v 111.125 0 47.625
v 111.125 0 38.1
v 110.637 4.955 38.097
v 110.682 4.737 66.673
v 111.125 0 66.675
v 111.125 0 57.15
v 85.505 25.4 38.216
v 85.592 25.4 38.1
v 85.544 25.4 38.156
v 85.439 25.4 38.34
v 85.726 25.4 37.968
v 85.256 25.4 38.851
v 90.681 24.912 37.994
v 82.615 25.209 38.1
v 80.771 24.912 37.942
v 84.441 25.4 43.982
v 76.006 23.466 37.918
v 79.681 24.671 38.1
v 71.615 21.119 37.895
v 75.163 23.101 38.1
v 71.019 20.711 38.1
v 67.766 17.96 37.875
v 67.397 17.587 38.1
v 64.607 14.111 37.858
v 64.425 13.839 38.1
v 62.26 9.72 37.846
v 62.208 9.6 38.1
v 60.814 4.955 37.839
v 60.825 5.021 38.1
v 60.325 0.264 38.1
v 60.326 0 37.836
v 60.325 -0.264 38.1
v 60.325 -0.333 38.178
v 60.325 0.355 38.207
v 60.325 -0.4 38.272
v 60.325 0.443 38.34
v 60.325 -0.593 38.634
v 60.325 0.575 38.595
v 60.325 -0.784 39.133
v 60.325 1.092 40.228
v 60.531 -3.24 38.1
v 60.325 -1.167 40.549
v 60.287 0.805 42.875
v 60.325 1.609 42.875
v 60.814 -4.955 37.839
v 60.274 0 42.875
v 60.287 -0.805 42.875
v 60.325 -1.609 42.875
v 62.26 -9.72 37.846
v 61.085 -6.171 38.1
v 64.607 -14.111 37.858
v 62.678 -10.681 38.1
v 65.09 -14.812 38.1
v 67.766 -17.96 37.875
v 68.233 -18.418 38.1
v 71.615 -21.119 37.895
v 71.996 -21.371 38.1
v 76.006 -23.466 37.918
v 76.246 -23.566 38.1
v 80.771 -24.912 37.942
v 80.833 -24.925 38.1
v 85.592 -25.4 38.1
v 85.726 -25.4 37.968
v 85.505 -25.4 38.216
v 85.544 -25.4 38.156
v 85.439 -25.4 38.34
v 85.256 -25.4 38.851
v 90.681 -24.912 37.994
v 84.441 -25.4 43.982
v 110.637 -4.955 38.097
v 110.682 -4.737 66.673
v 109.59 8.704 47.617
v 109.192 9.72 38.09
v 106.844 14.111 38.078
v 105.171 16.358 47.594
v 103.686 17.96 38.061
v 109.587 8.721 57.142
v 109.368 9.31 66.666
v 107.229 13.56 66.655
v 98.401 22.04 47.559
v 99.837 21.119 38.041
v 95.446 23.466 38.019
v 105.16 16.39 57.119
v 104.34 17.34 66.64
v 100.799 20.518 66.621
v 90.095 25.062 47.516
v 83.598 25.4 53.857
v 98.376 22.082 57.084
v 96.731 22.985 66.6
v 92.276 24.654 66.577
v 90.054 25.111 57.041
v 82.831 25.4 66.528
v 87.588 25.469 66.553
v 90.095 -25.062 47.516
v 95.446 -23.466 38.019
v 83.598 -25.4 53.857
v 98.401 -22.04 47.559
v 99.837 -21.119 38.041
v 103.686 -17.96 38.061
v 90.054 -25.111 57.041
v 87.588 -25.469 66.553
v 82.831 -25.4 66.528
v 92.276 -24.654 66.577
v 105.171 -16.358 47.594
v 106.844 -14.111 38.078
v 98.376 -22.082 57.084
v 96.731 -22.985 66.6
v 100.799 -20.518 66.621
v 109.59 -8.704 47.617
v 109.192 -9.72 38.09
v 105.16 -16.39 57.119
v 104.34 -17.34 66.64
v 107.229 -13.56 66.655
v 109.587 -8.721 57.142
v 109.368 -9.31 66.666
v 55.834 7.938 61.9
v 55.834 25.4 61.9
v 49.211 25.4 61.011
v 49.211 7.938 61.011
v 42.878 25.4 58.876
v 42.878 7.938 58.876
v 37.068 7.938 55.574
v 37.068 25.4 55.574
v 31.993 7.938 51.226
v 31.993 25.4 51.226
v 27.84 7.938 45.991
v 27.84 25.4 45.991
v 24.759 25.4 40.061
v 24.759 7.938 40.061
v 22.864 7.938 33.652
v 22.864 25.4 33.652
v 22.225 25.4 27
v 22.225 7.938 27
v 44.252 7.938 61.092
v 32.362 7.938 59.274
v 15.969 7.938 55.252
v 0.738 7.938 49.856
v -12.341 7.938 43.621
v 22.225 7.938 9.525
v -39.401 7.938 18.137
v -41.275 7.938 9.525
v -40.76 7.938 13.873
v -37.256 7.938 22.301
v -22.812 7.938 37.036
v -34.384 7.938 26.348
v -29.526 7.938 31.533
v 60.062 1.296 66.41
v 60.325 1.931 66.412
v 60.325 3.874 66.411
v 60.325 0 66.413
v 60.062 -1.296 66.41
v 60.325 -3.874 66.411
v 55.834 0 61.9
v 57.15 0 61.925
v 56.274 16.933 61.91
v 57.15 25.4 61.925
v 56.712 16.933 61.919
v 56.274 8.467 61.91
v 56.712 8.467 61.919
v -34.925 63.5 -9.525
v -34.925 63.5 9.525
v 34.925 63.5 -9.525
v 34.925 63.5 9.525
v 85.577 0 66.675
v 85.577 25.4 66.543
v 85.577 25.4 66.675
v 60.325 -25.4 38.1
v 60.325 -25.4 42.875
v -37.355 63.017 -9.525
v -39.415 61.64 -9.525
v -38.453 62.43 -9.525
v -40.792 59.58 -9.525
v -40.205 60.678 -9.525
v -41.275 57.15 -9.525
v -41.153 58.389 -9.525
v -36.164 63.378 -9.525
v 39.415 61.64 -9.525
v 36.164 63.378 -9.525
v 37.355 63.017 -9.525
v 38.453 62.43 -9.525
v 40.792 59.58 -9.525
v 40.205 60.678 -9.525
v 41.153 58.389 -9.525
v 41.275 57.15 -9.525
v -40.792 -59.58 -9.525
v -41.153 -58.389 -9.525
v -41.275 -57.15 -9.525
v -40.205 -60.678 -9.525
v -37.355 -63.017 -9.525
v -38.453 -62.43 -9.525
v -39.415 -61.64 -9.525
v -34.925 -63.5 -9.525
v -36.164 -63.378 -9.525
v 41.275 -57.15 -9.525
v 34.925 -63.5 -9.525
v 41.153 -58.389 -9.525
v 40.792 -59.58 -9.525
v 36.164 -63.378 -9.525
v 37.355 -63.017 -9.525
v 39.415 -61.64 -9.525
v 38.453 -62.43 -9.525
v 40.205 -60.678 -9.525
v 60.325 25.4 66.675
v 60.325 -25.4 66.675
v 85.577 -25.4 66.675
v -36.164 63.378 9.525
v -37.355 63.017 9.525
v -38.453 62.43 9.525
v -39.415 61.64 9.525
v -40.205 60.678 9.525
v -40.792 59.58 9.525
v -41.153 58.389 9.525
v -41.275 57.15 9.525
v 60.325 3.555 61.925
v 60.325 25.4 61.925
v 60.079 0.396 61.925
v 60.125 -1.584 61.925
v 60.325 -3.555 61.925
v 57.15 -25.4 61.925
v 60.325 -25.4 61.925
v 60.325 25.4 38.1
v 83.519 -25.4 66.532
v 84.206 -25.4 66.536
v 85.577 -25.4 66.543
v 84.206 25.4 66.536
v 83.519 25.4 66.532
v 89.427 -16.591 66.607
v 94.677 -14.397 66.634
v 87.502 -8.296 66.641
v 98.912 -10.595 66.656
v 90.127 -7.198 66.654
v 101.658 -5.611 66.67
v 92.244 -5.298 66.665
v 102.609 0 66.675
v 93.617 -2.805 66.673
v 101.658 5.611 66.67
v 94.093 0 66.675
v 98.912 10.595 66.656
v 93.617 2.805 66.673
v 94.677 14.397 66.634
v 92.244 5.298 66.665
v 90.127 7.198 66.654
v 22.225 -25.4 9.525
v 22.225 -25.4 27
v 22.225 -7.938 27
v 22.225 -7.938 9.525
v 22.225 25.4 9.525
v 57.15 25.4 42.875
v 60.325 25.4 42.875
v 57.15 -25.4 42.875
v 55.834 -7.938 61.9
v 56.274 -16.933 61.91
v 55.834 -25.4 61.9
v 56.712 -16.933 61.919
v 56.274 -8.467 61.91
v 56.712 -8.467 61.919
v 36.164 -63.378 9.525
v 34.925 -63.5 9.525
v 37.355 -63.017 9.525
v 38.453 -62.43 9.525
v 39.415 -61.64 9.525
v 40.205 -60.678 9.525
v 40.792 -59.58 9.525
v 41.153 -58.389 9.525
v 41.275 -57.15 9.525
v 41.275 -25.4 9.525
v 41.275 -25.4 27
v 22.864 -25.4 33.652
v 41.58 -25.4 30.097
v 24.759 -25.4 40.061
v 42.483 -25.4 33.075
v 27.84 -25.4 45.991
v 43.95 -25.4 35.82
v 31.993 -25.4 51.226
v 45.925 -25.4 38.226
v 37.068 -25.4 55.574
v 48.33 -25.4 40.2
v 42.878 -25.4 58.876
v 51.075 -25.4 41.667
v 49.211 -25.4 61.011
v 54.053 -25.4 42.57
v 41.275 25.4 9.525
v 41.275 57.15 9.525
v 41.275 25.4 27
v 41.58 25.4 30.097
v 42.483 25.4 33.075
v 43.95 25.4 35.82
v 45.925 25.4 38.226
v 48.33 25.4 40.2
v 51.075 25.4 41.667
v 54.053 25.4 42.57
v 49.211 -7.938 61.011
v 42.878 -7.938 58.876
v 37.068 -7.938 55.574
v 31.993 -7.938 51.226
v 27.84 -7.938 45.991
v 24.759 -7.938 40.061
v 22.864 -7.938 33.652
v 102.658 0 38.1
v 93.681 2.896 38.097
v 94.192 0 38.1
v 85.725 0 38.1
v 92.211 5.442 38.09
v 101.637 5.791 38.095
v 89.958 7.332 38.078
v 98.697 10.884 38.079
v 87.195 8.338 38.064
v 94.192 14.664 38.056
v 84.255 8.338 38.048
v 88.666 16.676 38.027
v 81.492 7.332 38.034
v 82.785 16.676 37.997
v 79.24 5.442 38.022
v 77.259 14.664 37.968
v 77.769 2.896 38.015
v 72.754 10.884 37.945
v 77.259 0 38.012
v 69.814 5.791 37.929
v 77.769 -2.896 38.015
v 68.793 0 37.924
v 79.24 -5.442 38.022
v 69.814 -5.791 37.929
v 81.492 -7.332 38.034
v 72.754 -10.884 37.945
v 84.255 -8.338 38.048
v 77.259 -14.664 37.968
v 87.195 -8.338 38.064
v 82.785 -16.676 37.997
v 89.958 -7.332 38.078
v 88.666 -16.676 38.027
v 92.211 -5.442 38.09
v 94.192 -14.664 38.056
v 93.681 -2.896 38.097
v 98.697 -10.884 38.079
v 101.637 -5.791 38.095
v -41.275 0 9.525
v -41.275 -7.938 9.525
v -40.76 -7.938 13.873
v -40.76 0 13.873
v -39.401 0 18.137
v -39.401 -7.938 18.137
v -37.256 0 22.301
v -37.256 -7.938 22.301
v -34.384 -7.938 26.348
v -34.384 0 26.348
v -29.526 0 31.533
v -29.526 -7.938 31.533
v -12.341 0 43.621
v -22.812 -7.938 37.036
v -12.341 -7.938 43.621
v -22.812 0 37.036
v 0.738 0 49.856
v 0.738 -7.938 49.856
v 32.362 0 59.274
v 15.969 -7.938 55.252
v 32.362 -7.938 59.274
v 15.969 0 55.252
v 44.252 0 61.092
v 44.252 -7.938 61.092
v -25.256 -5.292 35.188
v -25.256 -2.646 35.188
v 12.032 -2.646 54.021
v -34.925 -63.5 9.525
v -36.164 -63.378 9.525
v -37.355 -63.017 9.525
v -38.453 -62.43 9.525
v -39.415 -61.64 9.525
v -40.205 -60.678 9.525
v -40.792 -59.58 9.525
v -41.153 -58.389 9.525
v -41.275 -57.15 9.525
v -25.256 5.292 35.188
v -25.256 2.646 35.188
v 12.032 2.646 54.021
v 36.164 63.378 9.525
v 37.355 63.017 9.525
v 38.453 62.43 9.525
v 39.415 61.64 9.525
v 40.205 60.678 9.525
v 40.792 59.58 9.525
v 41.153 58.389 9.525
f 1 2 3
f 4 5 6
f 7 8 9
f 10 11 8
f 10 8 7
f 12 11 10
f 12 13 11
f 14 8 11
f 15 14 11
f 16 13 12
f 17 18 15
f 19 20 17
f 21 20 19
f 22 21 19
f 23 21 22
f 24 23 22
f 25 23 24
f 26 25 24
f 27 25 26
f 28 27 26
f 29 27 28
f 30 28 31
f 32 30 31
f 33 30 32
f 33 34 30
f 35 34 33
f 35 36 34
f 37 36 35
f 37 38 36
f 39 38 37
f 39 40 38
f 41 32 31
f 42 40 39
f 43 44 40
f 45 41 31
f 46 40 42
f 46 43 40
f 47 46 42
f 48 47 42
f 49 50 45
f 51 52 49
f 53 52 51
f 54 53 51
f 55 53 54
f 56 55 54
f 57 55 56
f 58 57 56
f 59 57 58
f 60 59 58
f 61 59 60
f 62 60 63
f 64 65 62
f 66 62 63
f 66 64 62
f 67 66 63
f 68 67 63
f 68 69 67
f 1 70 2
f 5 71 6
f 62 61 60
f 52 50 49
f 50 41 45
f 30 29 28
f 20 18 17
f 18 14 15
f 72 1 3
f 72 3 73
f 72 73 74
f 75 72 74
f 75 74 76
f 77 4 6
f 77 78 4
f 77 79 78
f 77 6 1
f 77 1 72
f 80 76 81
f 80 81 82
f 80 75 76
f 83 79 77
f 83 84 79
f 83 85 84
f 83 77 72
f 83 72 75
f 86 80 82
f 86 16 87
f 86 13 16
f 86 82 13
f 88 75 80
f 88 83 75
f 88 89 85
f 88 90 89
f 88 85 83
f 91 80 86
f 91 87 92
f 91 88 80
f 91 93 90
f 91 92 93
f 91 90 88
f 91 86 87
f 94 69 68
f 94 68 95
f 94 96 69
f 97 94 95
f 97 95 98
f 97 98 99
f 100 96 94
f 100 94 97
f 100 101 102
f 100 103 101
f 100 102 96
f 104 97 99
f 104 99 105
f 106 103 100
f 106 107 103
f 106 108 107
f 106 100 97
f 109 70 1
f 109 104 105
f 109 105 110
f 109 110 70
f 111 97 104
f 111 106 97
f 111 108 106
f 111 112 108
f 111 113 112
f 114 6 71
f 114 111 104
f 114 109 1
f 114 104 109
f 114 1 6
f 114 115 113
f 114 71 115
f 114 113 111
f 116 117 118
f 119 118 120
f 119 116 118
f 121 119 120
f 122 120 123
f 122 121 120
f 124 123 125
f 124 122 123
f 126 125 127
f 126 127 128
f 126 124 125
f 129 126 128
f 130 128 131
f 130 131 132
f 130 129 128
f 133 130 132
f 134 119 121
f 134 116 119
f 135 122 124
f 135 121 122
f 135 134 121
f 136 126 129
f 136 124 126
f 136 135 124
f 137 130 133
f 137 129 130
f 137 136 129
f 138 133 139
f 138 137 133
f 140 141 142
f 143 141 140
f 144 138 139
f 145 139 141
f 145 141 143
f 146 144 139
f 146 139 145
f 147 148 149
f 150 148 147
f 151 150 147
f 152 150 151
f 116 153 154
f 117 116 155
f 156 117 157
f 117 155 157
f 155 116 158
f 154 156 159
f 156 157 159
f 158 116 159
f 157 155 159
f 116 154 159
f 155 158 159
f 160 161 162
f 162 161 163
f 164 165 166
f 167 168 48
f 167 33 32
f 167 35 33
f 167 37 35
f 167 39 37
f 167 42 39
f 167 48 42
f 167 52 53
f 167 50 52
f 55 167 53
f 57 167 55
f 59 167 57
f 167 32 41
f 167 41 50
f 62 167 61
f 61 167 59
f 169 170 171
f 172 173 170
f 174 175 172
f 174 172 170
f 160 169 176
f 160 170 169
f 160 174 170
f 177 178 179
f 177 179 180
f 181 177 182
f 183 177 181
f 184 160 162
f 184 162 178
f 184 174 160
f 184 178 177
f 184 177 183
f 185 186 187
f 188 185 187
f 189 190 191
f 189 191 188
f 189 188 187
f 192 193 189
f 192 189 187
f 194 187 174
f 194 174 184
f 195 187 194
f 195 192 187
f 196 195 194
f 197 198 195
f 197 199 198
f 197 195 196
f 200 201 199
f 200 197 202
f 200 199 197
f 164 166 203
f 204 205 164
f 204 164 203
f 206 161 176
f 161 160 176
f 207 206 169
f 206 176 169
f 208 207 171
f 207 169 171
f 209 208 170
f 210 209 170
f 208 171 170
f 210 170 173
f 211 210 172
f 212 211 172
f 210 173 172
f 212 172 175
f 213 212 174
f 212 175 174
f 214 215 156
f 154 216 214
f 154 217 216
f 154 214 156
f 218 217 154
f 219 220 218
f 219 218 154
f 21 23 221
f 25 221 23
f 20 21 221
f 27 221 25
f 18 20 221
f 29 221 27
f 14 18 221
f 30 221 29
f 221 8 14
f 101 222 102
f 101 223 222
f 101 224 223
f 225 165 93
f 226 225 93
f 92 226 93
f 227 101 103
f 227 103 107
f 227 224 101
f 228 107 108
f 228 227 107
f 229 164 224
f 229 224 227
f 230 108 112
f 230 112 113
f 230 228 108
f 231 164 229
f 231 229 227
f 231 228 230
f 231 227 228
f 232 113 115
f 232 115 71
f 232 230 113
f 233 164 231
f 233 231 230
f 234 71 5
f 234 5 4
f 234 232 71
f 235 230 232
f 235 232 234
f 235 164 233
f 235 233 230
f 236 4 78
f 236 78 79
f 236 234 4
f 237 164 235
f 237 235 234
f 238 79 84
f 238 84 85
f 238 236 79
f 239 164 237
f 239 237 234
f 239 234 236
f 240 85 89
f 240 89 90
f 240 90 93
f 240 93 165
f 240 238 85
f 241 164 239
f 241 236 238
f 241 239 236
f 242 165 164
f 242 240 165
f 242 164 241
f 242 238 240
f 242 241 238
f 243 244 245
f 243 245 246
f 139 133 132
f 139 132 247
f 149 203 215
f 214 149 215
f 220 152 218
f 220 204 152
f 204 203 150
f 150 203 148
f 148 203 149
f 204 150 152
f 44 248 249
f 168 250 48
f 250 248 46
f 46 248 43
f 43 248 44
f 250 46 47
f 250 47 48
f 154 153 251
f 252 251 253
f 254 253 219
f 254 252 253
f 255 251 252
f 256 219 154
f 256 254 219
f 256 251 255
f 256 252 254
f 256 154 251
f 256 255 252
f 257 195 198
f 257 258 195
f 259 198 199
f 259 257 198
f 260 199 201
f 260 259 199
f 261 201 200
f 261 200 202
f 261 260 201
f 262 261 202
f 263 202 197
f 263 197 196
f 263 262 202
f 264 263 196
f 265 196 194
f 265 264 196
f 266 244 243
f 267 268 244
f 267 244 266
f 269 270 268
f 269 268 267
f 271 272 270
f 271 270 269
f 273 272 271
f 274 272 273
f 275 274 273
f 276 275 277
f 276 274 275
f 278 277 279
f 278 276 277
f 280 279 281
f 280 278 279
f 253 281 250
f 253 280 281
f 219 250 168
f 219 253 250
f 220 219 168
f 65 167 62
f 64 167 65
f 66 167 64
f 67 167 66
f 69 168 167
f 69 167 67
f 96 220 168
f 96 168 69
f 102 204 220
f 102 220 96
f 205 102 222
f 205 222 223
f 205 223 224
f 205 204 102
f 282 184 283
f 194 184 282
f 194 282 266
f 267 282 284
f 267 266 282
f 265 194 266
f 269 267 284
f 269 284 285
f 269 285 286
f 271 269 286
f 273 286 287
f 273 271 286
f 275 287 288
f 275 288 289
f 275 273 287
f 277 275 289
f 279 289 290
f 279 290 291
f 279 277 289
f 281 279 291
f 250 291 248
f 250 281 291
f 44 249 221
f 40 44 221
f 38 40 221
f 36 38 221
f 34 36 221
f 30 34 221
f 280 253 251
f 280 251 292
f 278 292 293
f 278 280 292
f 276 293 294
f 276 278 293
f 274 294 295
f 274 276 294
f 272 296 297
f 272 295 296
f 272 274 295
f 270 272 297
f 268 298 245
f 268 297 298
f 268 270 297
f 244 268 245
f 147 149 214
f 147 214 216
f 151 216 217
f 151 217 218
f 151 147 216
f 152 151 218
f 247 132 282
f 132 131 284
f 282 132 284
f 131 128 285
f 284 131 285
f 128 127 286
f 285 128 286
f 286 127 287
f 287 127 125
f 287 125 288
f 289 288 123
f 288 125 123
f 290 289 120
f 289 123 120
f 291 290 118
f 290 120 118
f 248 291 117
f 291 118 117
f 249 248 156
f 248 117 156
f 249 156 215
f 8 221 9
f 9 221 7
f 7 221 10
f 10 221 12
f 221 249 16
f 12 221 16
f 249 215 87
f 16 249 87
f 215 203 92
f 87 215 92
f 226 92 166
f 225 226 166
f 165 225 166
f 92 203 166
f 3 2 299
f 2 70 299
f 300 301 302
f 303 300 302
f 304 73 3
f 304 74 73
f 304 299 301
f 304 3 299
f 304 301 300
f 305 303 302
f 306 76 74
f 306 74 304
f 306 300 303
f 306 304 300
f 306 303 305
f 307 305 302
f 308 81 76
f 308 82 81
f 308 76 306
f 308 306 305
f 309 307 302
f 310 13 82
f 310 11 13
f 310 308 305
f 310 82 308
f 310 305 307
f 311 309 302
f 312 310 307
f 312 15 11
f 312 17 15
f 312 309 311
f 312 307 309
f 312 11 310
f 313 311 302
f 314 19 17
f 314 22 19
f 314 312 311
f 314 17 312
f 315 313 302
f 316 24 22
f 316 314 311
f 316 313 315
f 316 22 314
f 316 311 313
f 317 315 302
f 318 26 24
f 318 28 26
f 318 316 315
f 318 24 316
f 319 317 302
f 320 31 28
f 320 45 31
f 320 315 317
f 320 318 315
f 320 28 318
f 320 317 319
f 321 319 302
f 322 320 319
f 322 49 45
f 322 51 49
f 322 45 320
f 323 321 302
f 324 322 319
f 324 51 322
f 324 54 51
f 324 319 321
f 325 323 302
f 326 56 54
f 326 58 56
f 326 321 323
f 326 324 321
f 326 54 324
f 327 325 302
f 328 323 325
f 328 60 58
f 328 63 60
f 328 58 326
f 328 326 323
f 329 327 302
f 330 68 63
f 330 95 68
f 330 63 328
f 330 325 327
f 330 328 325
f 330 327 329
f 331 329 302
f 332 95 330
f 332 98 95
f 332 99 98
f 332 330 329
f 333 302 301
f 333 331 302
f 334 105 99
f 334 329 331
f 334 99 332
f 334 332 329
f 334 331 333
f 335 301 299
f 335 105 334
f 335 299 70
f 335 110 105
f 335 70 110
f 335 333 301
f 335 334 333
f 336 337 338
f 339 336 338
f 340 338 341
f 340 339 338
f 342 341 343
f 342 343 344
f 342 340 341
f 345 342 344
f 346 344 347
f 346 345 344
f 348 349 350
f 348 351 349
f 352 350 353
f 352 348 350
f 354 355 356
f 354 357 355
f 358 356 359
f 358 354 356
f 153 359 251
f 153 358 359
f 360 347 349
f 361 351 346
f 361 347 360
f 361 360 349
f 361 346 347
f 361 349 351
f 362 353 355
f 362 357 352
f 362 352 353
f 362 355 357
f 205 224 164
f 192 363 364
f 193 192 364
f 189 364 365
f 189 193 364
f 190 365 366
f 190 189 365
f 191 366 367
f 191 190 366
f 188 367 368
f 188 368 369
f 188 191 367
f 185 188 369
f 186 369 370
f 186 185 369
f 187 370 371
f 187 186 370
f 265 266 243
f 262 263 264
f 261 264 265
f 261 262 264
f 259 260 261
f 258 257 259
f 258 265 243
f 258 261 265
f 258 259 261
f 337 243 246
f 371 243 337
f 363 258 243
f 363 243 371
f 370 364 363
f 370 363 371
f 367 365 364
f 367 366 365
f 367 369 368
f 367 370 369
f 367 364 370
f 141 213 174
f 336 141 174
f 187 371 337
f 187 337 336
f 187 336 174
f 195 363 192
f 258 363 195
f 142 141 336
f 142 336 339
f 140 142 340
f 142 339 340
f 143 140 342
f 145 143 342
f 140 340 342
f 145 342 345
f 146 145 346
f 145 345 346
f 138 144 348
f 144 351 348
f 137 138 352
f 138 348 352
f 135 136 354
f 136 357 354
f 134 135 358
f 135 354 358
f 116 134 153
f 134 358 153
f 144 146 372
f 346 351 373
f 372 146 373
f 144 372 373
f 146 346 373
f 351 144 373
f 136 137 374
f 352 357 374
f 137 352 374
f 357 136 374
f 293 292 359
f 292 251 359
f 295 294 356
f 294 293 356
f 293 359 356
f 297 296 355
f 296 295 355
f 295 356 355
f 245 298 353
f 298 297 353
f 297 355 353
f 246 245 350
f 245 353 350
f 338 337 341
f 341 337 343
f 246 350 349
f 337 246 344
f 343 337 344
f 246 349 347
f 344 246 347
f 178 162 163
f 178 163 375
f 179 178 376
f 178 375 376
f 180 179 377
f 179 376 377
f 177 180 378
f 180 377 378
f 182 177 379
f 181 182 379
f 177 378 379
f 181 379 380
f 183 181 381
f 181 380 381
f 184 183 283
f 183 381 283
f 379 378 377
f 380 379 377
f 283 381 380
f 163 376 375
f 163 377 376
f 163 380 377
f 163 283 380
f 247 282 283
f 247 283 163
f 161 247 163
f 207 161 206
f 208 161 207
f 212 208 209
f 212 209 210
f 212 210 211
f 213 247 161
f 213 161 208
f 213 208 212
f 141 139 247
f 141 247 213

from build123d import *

# Parameters (mm, degrees)
F1_DEPTH = 63.5
F2_DEPTH = 25.4
F3_DEPTH = 7.9375
F5_R     = 6.35


with BuildPart() as f1:
    # F0 (on Front) → F1 (new body, symmetric)
    with BuildSketch(Plane.XZ):
        Polygon((-41.275, 9.525), (-41.275, -9.525), (41.275, -9.525), (41.275, 9.525), (22.225, 9.525), align=None)
    extrude(amount=F1_DEPTH, both=True)

    # F0 (on Front) → F2 (join, symmetric)
    with BuildSketch(Plane.XZ):
        with BuildLine():
            Line((22.225, 9.525), (41.275, 9.525))
            Line((41.275, 9.525), (41.275, 27.0002))
            ThreePointArc((41.275, 27.0002), (45.9246798487, 38.2255201513), (57.15, 42.8752))
            Line((57.15, 42.8752), (60.325, 42.8752))
            Line((60.325, 42.8752), (60.325, 61.9252))
            Line((60.325, 61.9252), (57.15, 61.9252))
            add(Edge.make_bspline(
                [(55.8342690967, 61.900407409), (56.274218932, 61.9111436169), (56.7128210879, 61.9194148517), (57.15, 61.9252)],
                knots=[110.352429098, 110.352429098, 110.352429098, 110.352429098, 111.5045361635, 111.5045361635, 111.5045361635, 111.5045361635], degree=3))
            ThreePointArc((55.8342690967, 61.900407409), (31.9934151086, 51.2262574919), (22.225, 27.0002))
            Line((22.225, 27.0002), (22.225, 9.525))
        make_face()
        Polygon((60.325, 66.675), (60.325, 61.9252), (60.325, 42.8752), (60.325, 38.1), (85.725, 38.1), (85.576608777, 66.675), align=None)
    extrude(amount=F2_DEPTH, both=True)

    # F0 (on Front) → F3 (join, symmetric)
    with BuildSketch(Plane.XZ):
        with BuildLine():
            add(Edge.make_bspline(
                [(-41.275, 9.525), (-40.8094440998, 37.2290406247), (13.6944936723, 60.8720597372), (55.8342690967, 61.900407409)],
                knots=[0, 0, 0, 0, 110.352429098, 110.352429098, 110.352429098, 110.352429098], degree=3))
            Line((-41.275, 9.525), (22.225, 9.525))
            Line((22.225, 9.525), (22.225, 27.0002))
            ThreePointArc((22.225, 27.0002), (31.9934151086, 51.2262574919), (55.8342690967, 61.900407409))
        make_face()
    extrude(amount=F3_DEPTH, both=True)

    # F0 (on Front) → F4 (revolve)
    with BuildSketch(Plane.XZ):
        Polygon((111.125, 66.675), (85.576608777, 66.675), (85.725, 38.1), (111.125, 38.1), align=None)
    revolve(axis=Axis((85.6508043885, 0, 52.3875), (-0.0051929737, 0, 0.9999865164)))

    # F5
    f5_edges = [f1.edges().sort_by_distance(p)[0] for p in [
        (-41.275, -63.5, 0),
        (41.275, -63.5, 0),
        (41.275, 63.5, 0),
        (-41.275, 63.5, 0),
    ]]
    fillet(f5_edges, radius=F5_R)


solid = f1.part
